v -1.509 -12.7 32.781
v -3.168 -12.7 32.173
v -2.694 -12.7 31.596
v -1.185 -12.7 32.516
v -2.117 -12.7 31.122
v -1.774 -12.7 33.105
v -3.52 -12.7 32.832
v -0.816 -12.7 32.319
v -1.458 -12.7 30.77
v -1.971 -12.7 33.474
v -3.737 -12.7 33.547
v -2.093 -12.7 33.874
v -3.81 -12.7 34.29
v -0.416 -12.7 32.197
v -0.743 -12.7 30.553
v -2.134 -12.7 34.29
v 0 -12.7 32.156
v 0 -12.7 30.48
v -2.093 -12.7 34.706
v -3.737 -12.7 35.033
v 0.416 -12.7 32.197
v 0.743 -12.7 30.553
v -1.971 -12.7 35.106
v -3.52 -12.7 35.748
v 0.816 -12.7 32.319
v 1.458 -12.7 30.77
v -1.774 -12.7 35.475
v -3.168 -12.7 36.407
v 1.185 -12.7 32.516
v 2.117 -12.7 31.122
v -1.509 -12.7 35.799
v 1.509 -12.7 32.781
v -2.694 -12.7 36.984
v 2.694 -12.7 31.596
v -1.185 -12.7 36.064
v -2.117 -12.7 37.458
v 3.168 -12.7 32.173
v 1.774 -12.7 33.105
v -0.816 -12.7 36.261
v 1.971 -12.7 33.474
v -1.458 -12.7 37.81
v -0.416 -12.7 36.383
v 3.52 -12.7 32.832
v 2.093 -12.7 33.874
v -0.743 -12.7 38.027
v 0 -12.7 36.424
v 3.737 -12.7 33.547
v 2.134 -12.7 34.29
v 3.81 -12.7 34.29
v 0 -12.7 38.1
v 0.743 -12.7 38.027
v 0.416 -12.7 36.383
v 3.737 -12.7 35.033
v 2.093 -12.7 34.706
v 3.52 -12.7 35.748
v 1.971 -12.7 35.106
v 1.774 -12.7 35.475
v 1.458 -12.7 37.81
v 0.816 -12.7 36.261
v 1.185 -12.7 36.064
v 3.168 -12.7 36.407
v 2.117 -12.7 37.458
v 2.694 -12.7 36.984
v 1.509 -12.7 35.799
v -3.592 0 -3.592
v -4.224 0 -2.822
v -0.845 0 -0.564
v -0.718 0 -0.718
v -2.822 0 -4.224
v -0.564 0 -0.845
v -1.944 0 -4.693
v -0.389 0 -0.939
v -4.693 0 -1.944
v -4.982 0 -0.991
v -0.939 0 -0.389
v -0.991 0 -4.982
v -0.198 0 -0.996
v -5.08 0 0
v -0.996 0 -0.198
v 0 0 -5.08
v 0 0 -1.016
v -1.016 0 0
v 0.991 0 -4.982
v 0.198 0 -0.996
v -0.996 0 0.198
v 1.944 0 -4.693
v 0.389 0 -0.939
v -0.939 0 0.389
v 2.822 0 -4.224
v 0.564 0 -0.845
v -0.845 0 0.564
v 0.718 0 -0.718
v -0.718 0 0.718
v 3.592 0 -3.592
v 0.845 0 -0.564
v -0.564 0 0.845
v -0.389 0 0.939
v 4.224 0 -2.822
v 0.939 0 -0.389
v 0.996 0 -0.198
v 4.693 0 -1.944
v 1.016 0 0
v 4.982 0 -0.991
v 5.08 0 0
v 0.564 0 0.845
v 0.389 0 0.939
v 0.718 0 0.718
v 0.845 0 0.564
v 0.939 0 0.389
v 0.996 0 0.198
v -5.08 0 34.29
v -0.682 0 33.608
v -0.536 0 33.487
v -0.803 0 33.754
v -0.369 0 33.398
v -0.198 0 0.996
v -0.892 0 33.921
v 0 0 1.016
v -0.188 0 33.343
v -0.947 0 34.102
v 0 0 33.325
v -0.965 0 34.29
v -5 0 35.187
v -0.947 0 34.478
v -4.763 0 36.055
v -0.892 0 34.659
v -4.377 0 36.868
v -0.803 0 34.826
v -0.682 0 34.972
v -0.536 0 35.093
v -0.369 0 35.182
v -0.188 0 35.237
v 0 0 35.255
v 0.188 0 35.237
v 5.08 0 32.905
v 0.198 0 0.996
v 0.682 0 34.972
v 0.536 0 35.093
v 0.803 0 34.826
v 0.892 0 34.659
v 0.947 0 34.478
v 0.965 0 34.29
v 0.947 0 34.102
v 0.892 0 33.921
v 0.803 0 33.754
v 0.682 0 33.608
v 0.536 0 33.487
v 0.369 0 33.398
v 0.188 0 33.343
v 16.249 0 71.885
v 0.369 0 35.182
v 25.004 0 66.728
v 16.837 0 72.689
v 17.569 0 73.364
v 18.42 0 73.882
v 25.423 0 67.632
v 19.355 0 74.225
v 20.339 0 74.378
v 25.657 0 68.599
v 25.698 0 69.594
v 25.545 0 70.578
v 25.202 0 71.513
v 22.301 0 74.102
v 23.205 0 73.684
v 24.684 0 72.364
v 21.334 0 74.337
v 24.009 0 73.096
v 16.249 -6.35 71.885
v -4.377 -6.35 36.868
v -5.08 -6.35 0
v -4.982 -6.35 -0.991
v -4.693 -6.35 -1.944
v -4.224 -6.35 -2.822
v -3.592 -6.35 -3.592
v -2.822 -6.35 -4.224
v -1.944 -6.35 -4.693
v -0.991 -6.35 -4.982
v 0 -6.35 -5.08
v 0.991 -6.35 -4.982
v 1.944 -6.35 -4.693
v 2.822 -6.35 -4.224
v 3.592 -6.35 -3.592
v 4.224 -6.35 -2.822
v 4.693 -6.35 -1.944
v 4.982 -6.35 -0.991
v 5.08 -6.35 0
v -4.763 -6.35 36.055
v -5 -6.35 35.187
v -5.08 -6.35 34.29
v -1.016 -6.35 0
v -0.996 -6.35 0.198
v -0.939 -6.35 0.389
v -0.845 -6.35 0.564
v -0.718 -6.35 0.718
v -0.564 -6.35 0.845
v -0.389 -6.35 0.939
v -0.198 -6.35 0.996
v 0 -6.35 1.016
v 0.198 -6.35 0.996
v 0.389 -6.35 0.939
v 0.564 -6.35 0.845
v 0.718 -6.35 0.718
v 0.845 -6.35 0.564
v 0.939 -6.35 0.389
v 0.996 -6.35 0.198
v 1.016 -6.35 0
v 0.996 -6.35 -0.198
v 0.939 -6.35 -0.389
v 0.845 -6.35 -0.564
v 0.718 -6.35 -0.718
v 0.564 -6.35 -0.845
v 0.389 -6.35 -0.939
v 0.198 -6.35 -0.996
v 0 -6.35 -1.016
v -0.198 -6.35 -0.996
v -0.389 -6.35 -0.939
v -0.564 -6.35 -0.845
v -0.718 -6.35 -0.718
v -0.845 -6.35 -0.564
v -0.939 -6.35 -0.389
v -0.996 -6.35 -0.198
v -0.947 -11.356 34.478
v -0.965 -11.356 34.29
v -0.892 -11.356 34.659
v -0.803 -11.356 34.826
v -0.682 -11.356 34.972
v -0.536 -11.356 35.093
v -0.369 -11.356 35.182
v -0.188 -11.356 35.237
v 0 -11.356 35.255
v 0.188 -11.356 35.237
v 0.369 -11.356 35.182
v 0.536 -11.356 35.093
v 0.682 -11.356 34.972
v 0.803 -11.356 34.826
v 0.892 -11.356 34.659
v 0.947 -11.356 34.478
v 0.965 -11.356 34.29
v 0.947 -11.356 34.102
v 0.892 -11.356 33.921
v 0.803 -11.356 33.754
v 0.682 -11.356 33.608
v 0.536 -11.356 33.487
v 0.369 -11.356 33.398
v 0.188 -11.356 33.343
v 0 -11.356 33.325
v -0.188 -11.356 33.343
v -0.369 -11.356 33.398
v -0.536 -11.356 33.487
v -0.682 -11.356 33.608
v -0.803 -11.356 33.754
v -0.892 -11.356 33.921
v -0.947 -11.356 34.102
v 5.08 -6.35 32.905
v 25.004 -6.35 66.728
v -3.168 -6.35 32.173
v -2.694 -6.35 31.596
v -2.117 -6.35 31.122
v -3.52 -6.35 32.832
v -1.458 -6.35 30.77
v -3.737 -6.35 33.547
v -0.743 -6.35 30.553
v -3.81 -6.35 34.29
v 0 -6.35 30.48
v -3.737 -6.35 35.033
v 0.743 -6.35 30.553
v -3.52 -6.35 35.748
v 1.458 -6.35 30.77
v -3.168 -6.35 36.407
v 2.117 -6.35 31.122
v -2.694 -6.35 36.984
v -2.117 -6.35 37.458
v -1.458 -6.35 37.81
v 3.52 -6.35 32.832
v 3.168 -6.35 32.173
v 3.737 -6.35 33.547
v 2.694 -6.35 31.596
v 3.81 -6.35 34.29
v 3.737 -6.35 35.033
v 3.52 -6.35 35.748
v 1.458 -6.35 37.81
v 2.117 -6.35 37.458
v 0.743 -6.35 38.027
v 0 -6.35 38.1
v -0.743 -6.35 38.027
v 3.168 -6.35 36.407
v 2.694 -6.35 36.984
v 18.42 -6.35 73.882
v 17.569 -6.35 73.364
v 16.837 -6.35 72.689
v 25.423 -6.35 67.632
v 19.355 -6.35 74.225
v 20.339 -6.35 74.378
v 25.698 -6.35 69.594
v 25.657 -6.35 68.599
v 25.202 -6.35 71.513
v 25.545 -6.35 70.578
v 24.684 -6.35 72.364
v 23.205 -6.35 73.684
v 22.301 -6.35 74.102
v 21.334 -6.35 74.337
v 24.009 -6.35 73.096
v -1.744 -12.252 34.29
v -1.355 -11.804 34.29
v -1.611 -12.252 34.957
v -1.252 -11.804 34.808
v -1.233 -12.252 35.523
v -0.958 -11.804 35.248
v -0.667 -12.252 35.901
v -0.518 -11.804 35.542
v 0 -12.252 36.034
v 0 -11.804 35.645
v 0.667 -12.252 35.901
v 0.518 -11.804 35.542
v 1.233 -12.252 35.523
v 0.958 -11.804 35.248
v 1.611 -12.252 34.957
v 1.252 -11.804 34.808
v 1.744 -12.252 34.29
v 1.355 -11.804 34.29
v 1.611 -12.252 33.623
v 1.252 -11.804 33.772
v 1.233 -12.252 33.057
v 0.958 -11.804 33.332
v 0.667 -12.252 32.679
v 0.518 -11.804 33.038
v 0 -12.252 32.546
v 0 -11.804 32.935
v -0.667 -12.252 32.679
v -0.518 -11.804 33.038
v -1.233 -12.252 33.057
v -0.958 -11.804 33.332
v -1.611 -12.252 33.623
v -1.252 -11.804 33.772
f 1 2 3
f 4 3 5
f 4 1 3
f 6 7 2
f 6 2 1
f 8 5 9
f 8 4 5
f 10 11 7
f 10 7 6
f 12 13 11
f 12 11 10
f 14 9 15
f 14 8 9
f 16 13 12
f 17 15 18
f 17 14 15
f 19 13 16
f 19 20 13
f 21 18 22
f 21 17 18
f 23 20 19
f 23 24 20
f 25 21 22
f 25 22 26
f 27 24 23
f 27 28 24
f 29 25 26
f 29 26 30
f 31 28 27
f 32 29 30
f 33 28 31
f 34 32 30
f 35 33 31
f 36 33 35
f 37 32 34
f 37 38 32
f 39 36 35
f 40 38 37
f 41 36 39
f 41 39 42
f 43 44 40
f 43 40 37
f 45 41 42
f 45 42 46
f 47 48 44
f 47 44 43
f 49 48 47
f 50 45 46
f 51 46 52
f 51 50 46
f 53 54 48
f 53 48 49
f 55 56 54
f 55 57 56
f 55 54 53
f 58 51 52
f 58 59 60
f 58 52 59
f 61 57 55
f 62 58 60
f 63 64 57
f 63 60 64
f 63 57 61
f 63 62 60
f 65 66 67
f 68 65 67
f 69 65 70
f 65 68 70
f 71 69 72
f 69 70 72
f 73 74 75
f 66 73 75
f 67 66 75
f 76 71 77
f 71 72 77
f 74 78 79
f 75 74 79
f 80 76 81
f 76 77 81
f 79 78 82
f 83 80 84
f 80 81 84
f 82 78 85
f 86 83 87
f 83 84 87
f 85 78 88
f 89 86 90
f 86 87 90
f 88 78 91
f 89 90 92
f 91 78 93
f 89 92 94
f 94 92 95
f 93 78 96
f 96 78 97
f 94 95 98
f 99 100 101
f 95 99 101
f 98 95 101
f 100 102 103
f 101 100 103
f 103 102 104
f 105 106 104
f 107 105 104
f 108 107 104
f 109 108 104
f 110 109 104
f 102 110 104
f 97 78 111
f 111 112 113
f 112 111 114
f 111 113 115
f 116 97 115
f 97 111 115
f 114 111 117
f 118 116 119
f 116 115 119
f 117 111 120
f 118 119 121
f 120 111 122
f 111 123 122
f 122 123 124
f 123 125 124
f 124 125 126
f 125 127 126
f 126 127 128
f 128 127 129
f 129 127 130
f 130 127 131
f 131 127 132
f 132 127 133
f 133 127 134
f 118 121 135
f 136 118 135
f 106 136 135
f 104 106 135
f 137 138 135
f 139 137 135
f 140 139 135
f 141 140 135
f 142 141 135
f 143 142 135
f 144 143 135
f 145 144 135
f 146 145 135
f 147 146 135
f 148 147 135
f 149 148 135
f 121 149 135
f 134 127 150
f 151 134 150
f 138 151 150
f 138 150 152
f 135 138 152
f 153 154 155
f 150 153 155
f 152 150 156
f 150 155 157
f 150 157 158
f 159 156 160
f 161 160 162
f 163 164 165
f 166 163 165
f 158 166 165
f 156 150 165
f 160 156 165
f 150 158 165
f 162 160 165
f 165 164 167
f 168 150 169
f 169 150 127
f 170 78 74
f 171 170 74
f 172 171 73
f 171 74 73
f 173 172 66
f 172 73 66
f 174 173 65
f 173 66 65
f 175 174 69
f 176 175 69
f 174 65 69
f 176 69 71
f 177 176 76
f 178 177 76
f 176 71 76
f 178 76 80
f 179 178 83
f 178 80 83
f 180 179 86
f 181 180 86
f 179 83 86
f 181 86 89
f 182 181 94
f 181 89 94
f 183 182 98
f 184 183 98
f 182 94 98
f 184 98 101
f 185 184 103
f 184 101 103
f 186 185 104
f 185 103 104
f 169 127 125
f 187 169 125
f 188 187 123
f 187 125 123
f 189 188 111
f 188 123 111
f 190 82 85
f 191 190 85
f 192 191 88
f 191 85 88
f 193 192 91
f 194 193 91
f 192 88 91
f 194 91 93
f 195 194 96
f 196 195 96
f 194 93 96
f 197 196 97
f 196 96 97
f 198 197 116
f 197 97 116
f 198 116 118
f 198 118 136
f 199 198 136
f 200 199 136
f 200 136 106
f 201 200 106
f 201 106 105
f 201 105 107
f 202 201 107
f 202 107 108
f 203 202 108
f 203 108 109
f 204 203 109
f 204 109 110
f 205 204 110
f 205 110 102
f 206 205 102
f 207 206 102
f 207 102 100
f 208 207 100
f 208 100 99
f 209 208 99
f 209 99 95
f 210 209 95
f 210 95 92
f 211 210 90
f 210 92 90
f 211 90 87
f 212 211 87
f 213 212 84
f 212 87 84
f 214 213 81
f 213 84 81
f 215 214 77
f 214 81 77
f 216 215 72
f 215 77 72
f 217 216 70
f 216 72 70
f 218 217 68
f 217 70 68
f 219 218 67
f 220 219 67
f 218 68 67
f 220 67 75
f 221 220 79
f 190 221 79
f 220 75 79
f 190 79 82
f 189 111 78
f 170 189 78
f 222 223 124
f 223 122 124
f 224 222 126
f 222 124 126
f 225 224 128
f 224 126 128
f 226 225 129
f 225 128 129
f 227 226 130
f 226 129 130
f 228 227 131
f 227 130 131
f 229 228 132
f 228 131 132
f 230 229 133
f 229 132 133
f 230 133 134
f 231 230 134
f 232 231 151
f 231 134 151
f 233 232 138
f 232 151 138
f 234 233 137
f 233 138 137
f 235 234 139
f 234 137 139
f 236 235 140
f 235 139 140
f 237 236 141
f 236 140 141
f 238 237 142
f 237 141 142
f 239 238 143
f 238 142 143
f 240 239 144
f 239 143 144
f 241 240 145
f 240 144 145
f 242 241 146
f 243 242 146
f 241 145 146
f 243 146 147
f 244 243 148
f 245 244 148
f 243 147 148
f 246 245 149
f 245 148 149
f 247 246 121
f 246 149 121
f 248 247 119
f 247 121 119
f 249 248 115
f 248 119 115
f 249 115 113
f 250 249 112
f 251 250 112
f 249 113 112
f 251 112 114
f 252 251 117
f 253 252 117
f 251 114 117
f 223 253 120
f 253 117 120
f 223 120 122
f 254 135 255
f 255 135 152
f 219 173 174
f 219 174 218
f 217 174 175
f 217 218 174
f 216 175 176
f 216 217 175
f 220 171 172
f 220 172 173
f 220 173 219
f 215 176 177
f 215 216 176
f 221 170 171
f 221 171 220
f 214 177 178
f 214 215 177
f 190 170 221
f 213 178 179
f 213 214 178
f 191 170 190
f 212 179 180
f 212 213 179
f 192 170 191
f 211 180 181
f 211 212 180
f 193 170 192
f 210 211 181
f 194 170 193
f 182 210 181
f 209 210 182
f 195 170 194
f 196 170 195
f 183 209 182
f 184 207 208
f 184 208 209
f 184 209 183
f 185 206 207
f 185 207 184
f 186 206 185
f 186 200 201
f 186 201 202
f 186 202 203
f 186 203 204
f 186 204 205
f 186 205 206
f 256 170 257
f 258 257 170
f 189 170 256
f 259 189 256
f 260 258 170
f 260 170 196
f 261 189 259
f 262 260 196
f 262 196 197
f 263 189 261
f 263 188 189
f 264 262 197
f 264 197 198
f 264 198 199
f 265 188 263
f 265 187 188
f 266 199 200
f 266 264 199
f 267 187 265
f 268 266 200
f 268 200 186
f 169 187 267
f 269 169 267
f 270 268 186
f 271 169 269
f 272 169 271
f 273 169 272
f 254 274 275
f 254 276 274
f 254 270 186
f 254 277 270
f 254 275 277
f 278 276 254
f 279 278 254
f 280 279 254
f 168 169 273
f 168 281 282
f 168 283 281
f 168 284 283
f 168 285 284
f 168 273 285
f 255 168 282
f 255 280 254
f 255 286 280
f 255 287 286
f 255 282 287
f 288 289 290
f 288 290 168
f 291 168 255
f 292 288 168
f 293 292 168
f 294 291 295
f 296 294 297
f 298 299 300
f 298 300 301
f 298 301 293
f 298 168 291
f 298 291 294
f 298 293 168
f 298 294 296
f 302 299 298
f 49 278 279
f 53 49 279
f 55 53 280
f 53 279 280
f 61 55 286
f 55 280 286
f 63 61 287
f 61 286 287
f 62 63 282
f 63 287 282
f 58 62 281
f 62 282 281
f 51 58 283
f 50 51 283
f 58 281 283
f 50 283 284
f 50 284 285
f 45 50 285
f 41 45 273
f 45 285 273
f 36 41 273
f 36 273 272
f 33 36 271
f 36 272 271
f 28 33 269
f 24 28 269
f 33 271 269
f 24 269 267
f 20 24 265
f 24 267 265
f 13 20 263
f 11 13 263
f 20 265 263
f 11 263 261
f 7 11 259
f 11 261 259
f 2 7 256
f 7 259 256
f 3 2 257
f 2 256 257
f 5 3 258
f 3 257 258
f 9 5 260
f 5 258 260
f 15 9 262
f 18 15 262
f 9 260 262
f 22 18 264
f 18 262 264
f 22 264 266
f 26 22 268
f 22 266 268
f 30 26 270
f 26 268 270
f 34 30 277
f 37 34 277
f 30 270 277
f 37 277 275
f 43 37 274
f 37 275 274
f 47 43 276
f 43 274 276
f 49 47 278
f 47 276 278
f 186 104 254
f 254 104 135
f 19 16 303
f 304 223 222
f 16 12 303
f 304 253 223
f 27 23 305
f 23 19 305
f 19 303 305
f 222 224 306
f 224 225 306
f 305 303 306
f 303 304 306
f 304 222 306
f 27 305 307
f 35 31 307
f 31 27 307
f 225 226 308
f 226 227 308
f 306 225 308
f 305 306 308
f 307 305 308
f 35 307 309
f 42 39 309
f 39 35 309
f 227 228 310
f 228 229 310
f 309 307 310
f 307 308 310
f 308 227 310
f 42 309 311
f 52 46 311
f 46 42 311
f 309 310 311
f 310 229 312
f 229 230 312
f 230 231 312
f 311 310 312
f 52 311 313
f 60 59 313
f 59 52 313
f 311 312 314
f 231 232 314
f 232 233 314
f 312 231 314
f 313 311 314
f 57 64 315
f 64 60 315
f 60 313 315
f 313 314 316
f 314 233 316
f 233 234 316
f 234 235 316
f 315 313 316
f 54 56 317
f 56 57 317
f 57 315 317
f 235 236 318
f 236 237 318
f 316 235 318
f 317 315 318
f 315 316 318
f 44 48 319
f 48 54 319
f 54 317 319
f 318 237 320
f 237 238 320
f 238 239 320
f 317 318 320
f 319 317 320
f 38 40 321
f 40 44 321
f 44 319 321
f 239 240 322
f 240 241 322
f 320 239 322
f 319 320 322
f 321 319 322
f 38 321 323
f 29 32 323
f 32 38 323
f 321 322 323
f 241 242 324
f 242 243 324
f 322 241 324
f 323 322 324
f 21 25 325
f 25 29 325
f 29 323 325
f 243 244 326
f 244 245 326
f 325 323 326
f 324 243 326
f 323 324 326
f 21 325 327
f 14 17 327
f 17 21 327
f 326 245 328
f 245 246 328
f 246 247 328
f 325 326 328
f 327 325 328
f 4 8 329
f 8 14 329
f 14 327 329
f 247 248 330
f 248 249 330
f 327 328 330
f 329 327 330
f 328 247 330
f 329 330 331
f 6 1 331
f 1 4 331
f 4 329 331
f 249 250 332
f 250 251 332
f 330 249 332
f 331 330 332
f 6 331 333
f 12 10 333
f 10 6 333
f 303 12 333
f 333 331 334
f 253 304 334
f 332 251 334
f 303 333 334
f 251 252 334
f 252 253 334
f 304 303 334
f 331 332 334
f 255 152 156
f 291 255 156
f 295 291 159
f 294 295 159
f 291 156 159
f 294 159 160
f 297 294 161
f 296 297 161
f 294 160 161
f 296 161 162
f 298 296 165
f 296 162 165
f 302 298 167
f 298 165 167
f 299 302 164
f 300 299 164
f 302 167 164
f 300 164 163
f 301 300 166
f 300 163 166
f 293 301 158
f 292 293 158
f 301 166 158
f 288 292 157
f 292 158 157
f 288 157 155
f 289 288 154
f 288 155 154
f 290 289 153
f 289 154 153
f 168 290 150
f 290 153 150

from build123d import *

# Parameters (mm, degrees)
F1_DEPTH       = 6.35
F2_R           = 3.81
F3_DEPTH       = 6.35
F5_D           = 1.9304
F5_CSINK_D     = 4.2672
F5_CSINK_ANGLE = 82
F7_D           = 2.032


with BuildPart() as f1:
    # F0 (on Front) → F1 (new body)
    with BuildSketch(Plane.XZ):
        with BuildLine():
            ThreePointArc((-5.08, 12.7), (-3.5921024484, 9.1078975516), (0, 7.62))
            Line((0, 7.62), (0, 12.7))
            Line((0, 12.7), (0, 17.78))
            ThreePointArc((0, 17.78), (-3.5921024484, 16.2921024484), (-5.08, 12.7))
        make_face()
        with BuildLine():
            Line((0, 12.7), (0, 7.62))
            ThreePointArc((0, 7.62), (3.5921024484, 9.1078975516), (5.08, 12.7))
            ThreePointArc((5.08, 12.7), (3.5921024484, 16.2921024484), (0, 17.78))
            Line((0, 17.78), (0, 12.7))
        make_face()
        with BuildLine():
            ThreePointArc((5.08, 12.7), (3.5921024484, 9.1078975516), (0, 7.62))
            ThreePointArc((0, 7.62), (-3.5921024484, 9.1078975516), (-5.08, 12.7))
            Line((-5.08, 12.7), (-5.08, 0))
            ThreePointArc((-5.08, 0), (0, -5.08), (5.08, 0))
            Line((5.08, 0), (5.08, 12.7))
        make_face()
        with BuildLine():
            ThreePointArc((0, 17.78), (3.5921024484, 16.2921024484), (5.08, 12.7))
            Line((5.08, 12.7), (5.08, 32.9050179497))
            Line((5.08, 32.9050179497), (4.3770618794, 31.711680915))
            ThreePointArc((4.3770618794, 31.711680915), (2.5207676458, 29.8795430536), (0, 29.21))
            Line((0, 29.21), (0, 17.78))
        make_face()
        with BuildLine():
            Line((-5.08, 34.29), (-5.08, 12.7))
            ThreePointArc((-5.08, 12.7), (-3.5921024484, 16.2921024484), (0, 17.78))
            Line((0, 17.78), (0, 29.21))
            ThreePointArc((0, 29.21), (-3.5921024484, 30.6978975516), (-5.08, 34.29))
        make_face()
        with BuildLine():
            Line((4.3770618794, 31.711680915), (5.08, 32.9050179497))
            Line((5.08, 32.9050179497), (5.08, 34.29))
            ThreePointArc((5.08, 34.29), (4.4104569464, 36.8107676458), (2.578319085, 38.6670618794))
            Line((2.578319085, 38.6670618794), (0, 34.29))
            Line((0, 34.29), (0, 29.21))
            ThreePointArc((0, 29.21), (2.5207676458, 29.8795430536), (4.3770618794, 31.711680915))
        make_face()
        with BuildLine():
            Line((5.08, 34.29), (5.08, 32.9050179497))
            Line((5.08, 32.9050179497), (25.0036145592, 66.7281759502))
            ThreePointArc((25.0036145592, 66.7281759502), (23.2048717648, 73.6835569145), (16.2494908004, 71.8848141201))
            Line((16.2494908004, 71.8848141201), (-4.3770618794, 36.868319085))
            ThreePointArc((-4.3770618794, 36.868319085), (-1.2719032275, 39.2081970456), (2.578319085, 38.6670618794))
            ThreePointArc((2.578319085, 38.6670618794), (4.4104569464, 36.8107676458), (5.08, 34.29))
        make_face()
        with BuildLine():
            ThreePointArc((-4.3770618794, 36.868319085), (-4.9011159111, 35.6262121188), (-5.08, 34.29))
            ThreePointArc((-5.08, 34.29), (-3.5921024484, 30.6978975516), (0, 29.21))
            Line((0, 29.21), (0, 34.29))
            Line((0, 34.29), (2.578319085, 38.6670618794))
            ThreePointArc((2.578319085, 38.6670618794), (-1.2719032275, 39.2081970456), (-4.3770618794, 36.868319085))
        make_face()
    extrude(amount=F1_DEPTH)

    # F2 (on face) → F3 (join)
    with BuildSketch(Plane.XZ.offset(6.35)):
        with Locations((0, 34.29)):
            Circle(F2_R)
    extrude(amount=F3_DEPTH)

    # F5 (through all)
    with Locations(Plane.XZ.offset(12.7)):
        with Locations((0, 34.29)):
            CounterSinkHole(F5_D / 2, F5_CSINK_D / 2, counter_sink_angle=F5_CSINK_ANGLE)

    # F7 (through all)
    with Locations(Plane.XZ.offset(6.35)):
        with Locations((0, 0)):
            Hole(F7_D / 2)


solid = f1.part
